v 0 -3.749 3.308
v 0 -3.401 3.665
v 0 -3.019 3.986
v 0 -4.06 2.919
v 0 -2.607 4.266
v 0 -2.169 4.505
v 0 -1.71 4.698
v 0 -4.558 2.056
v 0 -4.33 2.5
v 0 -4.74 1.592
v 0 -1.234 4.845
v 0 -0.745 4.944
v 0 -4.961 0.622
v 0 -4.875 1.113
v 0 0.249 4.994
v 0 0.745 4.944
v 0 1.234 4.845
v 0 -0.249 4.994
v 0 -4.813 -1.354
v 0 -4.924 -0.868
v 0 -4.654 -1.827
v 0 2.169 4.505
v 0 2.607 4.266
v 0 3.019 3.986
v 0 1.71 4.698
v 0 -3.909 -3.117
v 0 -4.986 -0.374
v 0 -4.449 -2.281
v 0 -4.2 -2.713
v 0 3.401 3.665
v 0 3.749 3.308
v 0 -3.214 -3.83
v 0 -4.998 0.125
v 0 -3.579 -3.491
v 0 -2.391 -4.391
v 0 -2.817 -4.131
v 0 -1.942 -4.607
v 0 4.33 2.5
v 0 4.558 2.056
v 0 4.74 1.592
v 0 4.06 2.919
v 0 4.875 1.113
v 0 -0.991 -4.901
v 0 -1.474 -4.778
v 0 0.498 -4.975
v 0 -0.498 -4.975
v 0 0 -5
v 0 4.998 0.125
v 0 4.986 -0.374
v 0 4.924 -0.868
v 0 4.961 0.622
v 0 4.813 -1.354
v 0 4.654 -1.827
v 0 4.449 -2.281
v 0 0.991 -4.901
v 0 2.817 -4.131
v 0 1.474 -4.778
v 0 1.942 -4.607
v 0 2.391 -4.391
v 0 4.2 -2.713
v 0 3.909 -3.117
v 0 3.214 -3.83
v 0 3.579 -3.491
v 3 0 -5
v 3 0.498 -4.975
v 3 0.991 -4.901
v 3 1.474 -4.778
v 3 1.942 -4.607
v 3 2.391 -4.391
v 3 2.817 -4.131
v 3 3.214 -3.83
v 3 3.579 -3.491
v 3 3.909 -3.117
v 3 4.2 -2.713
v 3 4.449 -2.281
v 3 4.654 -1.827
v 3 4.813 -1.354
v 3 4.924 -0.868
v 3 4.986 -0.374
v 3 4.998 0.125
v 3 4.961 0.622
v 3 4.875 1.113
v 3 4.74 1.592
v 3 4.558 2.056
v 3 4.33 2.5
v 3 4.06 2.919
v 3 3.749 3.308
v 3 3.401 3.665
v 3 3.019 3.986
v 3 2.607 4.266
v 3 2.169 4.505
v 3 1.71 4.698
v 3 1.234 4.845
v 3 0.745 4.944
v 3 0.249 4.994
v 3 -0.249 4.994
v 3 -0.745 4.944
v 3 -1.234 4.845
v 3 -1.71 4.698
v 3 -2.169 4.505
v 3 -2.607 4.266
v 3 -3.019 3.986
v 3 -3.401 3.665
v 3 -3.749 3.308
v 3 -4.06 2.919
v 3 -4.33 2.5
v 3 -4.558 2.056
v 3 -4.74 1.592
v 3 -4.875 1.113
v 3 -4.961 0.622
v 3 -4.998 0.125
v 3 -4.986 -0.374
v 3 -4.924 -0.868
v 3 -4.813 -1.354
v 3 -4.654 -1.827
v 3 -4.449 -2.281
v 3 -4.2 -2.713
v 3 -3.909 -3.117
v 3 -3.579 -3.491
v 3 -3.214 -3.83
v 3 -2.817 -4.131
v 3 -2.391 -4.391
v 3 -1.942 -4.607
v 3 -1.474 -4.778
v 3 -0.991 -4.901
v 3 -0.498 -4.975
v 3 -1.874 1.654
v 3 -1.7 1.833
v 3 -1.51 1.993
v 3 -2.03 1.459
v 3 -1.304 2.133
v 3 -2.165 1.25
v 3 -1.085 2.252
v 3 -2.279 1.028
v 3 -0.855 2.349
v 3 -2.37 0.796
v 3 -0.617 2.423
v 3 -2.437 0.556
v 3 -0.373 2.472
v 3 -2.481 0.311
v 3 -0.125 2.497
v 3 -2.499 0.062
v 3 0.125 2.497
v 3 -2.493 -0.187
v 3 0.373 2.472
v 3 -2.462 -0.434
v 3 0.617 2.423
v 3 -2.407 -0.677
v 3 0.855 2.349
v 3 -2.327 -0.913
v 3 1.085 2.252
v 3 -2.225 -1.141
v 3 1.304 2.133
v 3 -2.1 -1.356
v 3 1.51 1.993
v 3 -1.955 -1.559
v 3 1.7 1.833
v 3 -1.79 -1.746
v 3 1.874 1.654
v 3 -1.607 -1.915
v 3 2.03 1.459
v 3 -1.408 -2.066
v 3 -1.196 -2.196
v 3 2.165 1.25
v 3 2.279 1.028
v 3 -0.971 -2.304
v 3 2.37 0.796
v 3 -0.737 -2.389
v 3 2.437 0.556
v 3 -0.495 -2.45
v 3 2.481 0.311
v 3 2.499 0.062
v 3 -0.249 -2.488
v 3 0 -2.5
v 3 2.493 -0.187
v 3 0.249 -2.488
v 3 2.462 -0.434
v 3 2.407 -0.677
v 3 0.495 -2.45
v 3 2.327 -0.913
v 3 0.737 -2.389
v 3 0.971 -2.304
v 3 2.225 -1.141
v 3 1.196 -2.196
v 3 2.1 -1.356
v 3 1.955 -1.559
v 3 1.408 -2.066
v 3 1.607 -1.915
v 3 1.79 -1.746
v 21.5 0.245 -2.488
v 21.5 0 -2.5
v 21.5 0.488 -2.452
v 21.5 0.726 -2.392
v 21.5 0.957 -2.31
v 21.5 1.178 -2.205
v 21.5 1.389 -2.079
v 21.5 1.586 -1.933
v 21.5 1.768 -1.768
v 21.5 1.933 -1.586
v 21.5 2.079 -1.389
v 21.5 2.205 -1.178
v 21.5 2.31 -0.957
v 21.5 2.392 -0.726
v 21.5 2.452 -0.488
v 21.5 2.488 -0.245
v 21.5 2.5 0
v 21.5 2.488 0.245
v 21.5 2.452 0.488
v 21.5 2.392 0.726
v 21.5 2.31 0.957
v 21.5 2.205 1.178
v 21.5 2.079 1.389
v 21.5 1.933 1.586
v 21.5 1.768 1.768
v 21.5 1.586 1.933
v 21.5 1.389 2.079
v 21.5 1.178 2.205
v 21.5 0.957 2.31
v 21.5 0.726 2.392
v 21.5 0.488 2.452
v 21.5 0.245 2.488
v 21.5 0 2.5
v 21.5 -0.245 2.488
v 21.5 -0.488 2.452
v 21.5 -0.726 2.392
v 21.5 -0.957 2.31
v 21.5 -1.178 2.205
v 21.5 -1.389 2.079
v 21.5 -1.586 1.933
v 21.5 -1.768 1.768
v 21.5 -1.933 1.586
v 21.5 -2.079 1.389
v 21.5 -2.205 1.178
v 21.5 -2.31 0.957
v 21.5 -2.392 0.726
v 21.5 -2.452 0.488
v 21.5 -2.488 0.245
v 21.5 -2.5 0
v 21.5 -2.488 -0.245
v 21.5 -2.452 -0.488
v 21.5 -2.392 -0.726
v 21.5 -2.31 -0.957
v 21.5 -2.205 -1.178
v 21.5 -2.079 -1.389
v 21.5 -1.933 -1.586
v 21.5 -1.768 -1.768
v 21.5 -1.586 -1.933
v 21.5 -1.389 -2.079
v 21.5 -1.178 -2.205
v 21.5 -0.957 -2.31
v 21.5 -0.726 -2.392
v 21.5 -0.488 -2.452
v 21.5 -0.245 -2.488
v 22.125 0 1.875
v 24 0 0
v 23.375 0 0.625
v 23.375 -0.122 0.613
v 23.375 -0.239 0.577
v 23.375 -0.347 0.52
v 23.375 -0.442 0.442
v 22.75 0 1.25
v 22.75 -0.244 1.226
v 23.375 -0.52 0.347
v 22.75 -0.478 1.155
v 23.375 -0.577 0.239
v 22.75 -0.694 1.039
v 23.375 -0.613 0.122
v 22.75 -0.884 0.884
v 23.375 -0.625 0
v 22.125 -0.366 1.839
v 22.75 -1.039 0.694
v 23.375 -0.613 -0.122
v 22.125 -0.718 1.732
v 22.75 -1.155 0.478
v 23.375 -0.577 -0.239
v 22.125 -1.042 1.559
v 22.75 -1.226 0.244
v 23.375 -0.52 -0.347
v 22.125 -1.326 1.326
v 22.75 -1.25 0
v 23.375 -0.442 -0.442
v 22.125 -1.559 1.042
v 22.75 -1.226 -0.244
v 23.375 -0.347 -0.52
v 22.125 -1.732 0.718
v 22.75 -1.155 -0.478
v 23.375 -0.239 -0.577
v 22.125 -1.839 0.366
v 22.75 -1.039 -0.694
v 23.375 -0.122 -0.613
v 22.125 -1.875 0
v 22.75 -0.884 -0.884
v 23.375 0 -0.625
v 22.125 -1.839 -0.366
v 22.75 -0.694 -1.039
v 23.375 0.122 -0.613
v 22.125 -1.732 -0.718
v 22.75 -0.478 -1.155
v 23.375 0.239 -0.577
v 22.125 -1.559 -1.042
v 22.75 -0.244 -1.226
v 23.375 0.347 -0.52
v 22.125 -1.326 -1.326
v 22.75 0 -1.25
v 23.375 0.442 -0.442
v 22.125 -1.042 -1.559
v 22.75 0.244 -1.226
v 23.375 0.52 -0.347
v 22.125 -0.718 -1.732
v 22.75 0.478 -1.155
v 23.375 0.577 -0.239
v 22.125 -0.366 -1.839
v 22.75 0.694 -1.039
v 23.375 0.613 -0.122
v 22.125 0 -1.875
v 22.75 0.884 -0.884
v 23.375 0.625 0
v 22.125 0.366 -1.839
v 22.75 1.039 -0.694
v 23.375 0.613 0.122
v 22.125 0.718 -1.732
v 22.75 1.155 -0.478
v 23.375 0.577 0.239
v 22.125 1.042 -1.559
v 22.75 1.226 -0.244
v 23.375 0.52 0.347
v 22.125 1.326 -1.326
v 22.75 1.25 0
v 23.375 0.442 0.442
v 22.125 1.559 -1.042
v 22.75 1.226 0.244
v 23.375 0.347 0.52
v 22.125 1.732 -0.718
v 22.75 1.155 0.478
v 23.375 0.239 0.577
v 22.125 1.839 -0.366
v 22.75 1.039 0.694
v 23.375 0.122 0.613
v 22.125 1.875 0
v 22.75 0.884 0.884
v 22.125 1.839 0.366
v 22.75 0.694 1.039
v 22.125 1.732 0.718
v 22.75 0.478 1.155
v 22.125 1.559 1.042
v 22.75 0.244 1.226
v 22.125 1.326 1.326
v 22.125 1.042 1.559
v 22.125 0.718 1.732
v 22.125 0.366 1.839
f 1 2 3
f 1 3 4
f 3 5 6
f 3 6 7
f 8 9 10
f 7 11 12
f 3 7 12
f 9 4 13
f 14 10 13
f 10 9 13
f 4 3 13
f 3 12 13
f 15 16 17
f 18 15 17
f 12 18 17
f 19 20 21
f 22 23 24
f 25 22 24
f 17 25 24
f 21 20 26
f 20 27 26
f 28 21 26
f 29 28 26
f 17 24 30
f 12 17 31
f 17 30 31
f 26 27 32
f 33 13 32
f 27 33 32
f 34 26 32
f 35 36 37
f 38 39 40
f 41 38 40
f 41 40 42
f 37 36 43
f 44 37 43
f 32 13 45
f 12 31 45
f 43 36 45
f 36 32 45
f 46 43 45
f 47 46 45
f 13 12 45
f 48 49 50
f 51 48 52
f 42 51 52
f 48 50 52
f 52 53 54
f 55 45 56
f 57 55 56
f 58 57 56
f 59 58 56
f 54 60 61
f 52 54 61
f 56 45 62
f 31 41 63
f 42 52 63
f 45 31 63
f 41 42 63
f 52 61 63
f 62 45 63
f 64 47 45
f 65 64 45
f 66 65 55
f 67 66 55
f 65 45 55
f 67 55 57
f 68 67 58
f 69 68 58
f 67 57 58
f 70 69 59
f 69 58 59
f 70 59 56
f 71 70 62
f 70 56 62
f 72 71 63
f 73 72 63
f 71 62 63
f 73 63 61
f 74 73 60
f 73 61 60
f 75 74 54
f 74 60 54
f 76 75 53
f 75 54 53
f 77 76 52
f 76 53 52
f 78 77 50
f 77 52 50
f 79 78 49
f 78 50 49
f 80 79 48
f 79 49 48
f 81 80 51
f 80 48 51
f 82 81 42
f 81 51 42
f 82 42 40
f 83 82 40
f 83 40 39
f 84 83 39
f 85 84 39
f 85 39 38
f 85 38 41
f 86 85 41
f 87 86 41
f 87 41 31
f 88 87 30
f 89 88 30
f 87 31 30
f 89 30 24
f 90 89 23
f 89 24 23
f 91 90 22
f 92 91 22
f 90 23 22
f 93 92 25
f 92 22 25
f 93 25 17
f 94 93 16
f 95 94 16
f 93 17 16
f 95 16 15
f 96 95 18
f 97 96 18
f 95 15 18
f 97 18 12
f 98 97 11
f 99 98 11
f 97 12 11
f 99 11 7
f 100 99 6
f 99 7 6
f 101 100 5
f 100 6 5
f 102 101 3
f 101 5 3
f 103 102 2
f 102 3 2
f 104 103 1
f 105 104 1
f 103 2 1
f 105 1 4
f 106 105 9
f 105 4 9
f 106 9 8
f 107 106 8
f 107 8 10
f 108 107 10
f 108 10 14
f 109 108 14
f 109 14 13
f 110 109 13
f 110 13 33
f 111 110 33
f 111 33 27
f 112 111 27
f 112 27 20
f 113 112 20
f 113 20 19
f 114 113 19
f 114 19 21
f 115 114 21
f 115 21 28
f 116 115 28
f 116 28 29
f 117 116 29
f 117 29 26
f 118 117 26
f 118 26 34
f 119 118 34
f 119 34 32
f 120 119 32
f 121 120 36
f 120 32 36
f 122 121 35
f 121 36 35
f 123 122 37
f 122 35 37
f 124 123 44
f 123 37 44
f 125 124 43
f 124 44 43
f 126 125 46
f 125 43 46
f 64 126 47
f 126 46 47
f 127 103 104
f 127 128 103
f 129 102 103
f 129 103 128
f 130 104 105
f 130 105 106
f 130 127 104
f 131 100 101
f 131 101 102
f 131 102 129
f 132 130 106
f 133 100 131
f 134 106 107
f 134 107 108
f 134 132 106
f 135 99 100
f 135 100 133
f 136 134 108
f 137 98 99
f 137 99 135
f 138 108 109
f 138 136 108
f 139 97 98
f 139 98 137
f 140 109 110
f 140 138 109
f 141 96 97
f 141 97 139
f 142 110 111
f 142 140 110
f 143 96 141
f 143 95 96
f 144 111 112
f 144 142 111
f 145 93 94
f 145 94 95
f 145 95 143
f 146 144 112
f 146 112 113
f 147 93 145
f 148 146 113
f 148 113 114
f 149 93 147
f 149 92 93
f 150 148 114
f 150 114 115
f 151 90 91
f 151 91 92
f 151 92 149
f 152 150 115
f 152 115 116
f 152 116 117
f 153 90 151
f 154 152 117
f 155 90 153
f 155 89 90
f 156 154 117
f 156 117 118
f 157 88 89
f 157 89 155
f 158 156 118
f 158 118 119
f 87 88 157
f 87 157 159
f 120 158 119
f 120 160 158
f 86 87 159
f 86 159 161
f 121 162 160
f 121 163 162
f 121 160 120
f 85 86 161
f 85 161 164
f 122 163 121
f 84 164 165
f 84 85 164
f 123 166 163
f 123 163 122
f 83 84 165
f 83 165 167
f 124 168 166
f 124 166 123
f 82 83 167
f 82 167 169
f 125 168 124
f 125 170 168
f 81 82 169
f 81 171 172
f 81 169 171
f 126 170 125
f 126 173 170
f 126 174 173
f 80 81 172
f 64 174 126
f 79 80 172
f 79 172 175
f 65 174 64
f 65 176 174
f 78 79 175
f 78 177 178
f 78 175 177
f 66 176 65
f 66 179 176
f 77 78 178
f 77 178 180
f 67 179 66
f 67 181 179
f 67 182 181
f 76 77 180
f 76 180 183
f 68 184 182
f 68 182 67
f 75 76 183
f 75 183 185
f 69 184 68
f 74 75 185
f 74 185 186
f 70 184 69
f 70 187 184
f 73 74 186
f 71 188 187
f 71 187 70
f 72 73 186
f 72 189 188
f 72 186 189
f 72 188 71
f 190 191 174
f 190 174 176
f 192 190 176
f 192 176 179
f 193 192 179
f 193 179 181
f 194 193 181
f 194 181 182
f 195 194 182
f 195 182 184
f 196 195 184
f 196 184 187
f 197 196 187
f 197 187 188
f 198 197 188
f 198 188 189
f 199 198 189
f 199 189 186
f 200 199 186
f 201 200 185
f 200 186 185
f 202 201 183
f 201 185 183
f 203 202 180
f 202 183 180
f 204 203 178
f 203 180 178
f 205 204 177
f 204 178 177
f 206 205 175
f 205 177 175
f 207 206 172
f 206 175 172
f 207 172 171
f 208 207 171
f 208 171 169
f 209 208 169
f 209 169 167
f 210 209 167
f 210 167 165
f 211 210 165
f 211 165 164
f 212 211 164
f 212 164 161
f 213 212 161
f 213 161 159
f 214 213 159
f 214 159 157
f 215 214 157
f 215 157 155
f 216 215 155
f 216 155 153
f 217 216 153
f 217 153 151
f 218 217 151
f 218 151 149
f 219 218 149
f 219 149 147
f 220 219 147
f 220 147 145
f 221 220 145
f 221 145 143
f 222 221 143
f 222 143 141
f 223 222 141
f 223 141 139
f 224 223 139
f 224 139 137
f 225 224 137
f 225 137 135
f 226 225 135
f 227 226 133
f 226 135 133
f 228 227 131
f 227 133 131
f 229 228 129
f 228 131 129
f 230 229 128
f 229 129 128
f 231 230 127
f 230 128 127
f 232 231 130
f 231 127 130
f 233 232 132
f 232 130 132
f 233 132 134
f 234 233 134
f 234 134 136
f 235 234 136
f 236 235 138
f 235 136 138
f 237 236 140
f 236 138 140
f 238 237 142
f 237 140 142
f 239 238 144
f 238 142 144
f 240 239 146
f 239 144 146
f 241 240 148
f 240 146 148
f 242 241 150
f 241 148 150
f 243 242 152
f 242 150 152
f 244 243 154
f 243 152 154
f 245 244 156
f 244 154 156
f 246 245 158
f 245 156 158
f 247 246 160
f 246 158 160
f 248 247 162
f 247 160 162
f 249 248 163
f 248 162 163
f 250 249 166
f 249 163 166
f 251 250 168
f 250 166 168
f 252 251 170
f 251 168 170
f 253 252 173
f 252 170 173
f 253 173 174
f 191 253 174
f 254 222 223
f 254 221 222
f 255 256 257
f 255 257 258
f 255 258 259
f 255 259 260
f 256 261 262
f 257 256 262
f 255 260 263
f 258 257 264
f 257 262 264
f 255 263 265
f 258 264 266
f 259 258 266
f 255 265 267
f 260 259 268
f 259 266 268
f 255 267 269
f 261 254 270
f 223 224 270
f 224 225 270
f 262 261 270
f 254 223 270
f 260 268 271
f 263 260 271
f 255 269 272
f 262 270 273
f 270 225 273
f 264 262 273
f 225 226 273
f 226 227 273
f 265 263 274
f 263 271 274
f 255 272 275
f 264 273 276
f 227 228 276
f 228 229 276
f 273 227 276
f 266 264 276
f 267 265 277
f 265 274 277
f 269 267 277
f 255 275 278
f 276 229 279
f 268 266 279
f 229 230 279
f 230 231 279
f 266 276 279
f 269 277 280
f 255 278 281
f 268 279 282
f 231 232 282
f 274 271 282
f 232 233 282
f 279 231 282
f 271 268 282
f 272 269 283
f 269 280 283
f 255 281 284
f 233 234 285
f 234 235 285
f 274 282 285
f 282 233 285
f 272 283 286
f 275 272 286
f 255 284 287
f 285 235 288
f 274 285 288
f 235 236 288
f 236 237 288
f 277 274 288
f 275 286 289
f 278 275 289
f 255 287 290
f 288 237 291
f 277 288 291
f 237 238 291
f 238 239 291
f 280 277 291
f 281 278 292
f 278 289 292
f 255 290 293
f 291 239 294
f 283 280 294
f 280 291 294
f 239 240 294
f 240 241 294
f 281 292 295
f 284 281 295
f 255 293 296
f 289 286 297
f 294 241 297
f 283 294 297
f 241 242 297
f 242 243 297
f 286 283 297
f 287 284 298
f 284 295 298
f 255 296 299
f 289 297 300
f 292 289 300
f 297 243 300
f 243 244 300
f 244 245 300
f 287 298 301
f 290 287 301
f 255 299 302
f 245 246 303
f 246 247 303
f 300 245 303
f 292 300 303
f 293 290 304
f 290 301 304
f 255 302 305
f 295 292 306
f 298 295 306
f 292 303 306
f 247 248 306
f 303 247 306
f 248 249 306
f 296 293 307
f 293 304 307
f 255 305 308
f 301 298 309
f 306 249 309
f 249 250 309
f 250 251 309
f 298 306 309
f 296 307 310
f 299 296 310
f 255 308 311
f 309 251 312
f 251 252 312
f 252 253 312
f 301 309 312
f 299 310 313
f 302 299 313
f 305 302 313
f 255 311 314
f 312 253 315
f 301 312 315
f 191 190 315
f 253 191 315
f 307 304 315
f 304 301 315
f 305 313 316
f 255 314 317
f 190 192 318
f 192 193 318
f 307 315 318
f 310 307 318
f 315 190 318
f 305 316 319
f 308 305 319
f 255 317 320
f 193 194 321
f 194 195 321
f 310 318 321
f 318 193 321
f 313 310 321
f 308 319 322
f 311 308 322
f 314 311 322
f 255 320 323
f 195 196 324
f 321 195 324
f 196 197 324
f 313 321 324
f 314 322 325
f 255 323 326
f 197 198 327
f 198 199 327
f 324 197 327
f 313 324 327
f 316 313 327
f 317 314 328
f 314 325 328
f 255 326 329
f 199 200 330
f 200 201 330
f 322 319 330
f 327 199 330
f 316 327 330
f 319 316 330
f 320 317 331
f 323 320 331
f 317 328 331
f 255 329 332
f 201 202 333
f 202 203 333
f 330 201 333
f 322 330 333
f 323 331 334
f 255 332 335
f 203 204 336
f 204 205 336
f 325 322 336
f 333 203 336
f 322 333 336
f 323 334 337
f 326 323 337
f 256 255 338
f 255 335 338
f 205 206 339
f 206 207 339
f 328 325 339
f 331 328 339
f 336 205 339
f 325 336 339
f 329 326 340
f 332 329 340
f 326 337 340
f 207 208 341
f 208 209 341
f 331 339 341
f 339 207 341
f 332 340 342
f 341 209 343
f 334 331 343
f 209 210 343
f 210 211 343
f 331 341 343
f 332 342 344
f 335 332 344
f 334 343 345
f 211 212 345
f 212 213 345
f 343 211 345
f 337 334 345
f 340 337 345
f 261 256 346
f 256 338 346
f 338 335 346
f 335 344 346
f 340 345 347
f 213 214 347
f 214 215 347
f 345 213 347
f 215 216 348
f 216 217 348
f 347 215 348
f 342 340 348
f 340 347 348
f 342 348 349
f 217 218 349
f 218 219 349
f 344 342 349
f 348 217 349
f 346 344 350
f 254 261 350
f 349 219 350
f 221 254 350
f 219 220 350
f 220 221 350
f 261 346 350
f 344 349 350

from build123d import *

# Parameters (mm, degrees)
SKETCH1_R           = 5
BOSS_EXTRUDE1_DEPTH = 3
SKETCH3_R           = 2.5
BOSS_EXTRUDE2_DEPTH = 18.5


with BuildPart() as part:
    # Sketch1 → Boss-Extrude1 (new body)
    with BuildSketch(Plane(origin=(0, 0, 0), x_dir=(0, 0, -1), z_dir=(1, 0, 0))):
        Circle(SKETCH1_R)
    extrude(amount=BOSS_EXTRUDE1_DEPTH)

    # Sketch3 → Boss-Extrude2 (add)
    with BuildSketch(Plane(origin=(3, 0, 0), x_dir=(0, 0, -1), z_dir=(1, 0, 0))):
        Circle(SKETCH3_R)
    extrude(amount=BOSS_EXTRUDE2_DEPTH)

    # Sketch4 → Revolve1 (revolve)
    with BuildSketch(Plane.XY, mode=Mode.PRIVATE) as revolve1_sk:
        Polygon((21.5, 0), (24, 0), (21.5, 2.5), align=None)
    revolve(revolve1_sk.sketch.rotate(Axis((21.5, 0, 0), (1, 0, 0)), 90), axis=Axis((21.5, 0, 0), (1, 0, 0)))


solid = part.part
